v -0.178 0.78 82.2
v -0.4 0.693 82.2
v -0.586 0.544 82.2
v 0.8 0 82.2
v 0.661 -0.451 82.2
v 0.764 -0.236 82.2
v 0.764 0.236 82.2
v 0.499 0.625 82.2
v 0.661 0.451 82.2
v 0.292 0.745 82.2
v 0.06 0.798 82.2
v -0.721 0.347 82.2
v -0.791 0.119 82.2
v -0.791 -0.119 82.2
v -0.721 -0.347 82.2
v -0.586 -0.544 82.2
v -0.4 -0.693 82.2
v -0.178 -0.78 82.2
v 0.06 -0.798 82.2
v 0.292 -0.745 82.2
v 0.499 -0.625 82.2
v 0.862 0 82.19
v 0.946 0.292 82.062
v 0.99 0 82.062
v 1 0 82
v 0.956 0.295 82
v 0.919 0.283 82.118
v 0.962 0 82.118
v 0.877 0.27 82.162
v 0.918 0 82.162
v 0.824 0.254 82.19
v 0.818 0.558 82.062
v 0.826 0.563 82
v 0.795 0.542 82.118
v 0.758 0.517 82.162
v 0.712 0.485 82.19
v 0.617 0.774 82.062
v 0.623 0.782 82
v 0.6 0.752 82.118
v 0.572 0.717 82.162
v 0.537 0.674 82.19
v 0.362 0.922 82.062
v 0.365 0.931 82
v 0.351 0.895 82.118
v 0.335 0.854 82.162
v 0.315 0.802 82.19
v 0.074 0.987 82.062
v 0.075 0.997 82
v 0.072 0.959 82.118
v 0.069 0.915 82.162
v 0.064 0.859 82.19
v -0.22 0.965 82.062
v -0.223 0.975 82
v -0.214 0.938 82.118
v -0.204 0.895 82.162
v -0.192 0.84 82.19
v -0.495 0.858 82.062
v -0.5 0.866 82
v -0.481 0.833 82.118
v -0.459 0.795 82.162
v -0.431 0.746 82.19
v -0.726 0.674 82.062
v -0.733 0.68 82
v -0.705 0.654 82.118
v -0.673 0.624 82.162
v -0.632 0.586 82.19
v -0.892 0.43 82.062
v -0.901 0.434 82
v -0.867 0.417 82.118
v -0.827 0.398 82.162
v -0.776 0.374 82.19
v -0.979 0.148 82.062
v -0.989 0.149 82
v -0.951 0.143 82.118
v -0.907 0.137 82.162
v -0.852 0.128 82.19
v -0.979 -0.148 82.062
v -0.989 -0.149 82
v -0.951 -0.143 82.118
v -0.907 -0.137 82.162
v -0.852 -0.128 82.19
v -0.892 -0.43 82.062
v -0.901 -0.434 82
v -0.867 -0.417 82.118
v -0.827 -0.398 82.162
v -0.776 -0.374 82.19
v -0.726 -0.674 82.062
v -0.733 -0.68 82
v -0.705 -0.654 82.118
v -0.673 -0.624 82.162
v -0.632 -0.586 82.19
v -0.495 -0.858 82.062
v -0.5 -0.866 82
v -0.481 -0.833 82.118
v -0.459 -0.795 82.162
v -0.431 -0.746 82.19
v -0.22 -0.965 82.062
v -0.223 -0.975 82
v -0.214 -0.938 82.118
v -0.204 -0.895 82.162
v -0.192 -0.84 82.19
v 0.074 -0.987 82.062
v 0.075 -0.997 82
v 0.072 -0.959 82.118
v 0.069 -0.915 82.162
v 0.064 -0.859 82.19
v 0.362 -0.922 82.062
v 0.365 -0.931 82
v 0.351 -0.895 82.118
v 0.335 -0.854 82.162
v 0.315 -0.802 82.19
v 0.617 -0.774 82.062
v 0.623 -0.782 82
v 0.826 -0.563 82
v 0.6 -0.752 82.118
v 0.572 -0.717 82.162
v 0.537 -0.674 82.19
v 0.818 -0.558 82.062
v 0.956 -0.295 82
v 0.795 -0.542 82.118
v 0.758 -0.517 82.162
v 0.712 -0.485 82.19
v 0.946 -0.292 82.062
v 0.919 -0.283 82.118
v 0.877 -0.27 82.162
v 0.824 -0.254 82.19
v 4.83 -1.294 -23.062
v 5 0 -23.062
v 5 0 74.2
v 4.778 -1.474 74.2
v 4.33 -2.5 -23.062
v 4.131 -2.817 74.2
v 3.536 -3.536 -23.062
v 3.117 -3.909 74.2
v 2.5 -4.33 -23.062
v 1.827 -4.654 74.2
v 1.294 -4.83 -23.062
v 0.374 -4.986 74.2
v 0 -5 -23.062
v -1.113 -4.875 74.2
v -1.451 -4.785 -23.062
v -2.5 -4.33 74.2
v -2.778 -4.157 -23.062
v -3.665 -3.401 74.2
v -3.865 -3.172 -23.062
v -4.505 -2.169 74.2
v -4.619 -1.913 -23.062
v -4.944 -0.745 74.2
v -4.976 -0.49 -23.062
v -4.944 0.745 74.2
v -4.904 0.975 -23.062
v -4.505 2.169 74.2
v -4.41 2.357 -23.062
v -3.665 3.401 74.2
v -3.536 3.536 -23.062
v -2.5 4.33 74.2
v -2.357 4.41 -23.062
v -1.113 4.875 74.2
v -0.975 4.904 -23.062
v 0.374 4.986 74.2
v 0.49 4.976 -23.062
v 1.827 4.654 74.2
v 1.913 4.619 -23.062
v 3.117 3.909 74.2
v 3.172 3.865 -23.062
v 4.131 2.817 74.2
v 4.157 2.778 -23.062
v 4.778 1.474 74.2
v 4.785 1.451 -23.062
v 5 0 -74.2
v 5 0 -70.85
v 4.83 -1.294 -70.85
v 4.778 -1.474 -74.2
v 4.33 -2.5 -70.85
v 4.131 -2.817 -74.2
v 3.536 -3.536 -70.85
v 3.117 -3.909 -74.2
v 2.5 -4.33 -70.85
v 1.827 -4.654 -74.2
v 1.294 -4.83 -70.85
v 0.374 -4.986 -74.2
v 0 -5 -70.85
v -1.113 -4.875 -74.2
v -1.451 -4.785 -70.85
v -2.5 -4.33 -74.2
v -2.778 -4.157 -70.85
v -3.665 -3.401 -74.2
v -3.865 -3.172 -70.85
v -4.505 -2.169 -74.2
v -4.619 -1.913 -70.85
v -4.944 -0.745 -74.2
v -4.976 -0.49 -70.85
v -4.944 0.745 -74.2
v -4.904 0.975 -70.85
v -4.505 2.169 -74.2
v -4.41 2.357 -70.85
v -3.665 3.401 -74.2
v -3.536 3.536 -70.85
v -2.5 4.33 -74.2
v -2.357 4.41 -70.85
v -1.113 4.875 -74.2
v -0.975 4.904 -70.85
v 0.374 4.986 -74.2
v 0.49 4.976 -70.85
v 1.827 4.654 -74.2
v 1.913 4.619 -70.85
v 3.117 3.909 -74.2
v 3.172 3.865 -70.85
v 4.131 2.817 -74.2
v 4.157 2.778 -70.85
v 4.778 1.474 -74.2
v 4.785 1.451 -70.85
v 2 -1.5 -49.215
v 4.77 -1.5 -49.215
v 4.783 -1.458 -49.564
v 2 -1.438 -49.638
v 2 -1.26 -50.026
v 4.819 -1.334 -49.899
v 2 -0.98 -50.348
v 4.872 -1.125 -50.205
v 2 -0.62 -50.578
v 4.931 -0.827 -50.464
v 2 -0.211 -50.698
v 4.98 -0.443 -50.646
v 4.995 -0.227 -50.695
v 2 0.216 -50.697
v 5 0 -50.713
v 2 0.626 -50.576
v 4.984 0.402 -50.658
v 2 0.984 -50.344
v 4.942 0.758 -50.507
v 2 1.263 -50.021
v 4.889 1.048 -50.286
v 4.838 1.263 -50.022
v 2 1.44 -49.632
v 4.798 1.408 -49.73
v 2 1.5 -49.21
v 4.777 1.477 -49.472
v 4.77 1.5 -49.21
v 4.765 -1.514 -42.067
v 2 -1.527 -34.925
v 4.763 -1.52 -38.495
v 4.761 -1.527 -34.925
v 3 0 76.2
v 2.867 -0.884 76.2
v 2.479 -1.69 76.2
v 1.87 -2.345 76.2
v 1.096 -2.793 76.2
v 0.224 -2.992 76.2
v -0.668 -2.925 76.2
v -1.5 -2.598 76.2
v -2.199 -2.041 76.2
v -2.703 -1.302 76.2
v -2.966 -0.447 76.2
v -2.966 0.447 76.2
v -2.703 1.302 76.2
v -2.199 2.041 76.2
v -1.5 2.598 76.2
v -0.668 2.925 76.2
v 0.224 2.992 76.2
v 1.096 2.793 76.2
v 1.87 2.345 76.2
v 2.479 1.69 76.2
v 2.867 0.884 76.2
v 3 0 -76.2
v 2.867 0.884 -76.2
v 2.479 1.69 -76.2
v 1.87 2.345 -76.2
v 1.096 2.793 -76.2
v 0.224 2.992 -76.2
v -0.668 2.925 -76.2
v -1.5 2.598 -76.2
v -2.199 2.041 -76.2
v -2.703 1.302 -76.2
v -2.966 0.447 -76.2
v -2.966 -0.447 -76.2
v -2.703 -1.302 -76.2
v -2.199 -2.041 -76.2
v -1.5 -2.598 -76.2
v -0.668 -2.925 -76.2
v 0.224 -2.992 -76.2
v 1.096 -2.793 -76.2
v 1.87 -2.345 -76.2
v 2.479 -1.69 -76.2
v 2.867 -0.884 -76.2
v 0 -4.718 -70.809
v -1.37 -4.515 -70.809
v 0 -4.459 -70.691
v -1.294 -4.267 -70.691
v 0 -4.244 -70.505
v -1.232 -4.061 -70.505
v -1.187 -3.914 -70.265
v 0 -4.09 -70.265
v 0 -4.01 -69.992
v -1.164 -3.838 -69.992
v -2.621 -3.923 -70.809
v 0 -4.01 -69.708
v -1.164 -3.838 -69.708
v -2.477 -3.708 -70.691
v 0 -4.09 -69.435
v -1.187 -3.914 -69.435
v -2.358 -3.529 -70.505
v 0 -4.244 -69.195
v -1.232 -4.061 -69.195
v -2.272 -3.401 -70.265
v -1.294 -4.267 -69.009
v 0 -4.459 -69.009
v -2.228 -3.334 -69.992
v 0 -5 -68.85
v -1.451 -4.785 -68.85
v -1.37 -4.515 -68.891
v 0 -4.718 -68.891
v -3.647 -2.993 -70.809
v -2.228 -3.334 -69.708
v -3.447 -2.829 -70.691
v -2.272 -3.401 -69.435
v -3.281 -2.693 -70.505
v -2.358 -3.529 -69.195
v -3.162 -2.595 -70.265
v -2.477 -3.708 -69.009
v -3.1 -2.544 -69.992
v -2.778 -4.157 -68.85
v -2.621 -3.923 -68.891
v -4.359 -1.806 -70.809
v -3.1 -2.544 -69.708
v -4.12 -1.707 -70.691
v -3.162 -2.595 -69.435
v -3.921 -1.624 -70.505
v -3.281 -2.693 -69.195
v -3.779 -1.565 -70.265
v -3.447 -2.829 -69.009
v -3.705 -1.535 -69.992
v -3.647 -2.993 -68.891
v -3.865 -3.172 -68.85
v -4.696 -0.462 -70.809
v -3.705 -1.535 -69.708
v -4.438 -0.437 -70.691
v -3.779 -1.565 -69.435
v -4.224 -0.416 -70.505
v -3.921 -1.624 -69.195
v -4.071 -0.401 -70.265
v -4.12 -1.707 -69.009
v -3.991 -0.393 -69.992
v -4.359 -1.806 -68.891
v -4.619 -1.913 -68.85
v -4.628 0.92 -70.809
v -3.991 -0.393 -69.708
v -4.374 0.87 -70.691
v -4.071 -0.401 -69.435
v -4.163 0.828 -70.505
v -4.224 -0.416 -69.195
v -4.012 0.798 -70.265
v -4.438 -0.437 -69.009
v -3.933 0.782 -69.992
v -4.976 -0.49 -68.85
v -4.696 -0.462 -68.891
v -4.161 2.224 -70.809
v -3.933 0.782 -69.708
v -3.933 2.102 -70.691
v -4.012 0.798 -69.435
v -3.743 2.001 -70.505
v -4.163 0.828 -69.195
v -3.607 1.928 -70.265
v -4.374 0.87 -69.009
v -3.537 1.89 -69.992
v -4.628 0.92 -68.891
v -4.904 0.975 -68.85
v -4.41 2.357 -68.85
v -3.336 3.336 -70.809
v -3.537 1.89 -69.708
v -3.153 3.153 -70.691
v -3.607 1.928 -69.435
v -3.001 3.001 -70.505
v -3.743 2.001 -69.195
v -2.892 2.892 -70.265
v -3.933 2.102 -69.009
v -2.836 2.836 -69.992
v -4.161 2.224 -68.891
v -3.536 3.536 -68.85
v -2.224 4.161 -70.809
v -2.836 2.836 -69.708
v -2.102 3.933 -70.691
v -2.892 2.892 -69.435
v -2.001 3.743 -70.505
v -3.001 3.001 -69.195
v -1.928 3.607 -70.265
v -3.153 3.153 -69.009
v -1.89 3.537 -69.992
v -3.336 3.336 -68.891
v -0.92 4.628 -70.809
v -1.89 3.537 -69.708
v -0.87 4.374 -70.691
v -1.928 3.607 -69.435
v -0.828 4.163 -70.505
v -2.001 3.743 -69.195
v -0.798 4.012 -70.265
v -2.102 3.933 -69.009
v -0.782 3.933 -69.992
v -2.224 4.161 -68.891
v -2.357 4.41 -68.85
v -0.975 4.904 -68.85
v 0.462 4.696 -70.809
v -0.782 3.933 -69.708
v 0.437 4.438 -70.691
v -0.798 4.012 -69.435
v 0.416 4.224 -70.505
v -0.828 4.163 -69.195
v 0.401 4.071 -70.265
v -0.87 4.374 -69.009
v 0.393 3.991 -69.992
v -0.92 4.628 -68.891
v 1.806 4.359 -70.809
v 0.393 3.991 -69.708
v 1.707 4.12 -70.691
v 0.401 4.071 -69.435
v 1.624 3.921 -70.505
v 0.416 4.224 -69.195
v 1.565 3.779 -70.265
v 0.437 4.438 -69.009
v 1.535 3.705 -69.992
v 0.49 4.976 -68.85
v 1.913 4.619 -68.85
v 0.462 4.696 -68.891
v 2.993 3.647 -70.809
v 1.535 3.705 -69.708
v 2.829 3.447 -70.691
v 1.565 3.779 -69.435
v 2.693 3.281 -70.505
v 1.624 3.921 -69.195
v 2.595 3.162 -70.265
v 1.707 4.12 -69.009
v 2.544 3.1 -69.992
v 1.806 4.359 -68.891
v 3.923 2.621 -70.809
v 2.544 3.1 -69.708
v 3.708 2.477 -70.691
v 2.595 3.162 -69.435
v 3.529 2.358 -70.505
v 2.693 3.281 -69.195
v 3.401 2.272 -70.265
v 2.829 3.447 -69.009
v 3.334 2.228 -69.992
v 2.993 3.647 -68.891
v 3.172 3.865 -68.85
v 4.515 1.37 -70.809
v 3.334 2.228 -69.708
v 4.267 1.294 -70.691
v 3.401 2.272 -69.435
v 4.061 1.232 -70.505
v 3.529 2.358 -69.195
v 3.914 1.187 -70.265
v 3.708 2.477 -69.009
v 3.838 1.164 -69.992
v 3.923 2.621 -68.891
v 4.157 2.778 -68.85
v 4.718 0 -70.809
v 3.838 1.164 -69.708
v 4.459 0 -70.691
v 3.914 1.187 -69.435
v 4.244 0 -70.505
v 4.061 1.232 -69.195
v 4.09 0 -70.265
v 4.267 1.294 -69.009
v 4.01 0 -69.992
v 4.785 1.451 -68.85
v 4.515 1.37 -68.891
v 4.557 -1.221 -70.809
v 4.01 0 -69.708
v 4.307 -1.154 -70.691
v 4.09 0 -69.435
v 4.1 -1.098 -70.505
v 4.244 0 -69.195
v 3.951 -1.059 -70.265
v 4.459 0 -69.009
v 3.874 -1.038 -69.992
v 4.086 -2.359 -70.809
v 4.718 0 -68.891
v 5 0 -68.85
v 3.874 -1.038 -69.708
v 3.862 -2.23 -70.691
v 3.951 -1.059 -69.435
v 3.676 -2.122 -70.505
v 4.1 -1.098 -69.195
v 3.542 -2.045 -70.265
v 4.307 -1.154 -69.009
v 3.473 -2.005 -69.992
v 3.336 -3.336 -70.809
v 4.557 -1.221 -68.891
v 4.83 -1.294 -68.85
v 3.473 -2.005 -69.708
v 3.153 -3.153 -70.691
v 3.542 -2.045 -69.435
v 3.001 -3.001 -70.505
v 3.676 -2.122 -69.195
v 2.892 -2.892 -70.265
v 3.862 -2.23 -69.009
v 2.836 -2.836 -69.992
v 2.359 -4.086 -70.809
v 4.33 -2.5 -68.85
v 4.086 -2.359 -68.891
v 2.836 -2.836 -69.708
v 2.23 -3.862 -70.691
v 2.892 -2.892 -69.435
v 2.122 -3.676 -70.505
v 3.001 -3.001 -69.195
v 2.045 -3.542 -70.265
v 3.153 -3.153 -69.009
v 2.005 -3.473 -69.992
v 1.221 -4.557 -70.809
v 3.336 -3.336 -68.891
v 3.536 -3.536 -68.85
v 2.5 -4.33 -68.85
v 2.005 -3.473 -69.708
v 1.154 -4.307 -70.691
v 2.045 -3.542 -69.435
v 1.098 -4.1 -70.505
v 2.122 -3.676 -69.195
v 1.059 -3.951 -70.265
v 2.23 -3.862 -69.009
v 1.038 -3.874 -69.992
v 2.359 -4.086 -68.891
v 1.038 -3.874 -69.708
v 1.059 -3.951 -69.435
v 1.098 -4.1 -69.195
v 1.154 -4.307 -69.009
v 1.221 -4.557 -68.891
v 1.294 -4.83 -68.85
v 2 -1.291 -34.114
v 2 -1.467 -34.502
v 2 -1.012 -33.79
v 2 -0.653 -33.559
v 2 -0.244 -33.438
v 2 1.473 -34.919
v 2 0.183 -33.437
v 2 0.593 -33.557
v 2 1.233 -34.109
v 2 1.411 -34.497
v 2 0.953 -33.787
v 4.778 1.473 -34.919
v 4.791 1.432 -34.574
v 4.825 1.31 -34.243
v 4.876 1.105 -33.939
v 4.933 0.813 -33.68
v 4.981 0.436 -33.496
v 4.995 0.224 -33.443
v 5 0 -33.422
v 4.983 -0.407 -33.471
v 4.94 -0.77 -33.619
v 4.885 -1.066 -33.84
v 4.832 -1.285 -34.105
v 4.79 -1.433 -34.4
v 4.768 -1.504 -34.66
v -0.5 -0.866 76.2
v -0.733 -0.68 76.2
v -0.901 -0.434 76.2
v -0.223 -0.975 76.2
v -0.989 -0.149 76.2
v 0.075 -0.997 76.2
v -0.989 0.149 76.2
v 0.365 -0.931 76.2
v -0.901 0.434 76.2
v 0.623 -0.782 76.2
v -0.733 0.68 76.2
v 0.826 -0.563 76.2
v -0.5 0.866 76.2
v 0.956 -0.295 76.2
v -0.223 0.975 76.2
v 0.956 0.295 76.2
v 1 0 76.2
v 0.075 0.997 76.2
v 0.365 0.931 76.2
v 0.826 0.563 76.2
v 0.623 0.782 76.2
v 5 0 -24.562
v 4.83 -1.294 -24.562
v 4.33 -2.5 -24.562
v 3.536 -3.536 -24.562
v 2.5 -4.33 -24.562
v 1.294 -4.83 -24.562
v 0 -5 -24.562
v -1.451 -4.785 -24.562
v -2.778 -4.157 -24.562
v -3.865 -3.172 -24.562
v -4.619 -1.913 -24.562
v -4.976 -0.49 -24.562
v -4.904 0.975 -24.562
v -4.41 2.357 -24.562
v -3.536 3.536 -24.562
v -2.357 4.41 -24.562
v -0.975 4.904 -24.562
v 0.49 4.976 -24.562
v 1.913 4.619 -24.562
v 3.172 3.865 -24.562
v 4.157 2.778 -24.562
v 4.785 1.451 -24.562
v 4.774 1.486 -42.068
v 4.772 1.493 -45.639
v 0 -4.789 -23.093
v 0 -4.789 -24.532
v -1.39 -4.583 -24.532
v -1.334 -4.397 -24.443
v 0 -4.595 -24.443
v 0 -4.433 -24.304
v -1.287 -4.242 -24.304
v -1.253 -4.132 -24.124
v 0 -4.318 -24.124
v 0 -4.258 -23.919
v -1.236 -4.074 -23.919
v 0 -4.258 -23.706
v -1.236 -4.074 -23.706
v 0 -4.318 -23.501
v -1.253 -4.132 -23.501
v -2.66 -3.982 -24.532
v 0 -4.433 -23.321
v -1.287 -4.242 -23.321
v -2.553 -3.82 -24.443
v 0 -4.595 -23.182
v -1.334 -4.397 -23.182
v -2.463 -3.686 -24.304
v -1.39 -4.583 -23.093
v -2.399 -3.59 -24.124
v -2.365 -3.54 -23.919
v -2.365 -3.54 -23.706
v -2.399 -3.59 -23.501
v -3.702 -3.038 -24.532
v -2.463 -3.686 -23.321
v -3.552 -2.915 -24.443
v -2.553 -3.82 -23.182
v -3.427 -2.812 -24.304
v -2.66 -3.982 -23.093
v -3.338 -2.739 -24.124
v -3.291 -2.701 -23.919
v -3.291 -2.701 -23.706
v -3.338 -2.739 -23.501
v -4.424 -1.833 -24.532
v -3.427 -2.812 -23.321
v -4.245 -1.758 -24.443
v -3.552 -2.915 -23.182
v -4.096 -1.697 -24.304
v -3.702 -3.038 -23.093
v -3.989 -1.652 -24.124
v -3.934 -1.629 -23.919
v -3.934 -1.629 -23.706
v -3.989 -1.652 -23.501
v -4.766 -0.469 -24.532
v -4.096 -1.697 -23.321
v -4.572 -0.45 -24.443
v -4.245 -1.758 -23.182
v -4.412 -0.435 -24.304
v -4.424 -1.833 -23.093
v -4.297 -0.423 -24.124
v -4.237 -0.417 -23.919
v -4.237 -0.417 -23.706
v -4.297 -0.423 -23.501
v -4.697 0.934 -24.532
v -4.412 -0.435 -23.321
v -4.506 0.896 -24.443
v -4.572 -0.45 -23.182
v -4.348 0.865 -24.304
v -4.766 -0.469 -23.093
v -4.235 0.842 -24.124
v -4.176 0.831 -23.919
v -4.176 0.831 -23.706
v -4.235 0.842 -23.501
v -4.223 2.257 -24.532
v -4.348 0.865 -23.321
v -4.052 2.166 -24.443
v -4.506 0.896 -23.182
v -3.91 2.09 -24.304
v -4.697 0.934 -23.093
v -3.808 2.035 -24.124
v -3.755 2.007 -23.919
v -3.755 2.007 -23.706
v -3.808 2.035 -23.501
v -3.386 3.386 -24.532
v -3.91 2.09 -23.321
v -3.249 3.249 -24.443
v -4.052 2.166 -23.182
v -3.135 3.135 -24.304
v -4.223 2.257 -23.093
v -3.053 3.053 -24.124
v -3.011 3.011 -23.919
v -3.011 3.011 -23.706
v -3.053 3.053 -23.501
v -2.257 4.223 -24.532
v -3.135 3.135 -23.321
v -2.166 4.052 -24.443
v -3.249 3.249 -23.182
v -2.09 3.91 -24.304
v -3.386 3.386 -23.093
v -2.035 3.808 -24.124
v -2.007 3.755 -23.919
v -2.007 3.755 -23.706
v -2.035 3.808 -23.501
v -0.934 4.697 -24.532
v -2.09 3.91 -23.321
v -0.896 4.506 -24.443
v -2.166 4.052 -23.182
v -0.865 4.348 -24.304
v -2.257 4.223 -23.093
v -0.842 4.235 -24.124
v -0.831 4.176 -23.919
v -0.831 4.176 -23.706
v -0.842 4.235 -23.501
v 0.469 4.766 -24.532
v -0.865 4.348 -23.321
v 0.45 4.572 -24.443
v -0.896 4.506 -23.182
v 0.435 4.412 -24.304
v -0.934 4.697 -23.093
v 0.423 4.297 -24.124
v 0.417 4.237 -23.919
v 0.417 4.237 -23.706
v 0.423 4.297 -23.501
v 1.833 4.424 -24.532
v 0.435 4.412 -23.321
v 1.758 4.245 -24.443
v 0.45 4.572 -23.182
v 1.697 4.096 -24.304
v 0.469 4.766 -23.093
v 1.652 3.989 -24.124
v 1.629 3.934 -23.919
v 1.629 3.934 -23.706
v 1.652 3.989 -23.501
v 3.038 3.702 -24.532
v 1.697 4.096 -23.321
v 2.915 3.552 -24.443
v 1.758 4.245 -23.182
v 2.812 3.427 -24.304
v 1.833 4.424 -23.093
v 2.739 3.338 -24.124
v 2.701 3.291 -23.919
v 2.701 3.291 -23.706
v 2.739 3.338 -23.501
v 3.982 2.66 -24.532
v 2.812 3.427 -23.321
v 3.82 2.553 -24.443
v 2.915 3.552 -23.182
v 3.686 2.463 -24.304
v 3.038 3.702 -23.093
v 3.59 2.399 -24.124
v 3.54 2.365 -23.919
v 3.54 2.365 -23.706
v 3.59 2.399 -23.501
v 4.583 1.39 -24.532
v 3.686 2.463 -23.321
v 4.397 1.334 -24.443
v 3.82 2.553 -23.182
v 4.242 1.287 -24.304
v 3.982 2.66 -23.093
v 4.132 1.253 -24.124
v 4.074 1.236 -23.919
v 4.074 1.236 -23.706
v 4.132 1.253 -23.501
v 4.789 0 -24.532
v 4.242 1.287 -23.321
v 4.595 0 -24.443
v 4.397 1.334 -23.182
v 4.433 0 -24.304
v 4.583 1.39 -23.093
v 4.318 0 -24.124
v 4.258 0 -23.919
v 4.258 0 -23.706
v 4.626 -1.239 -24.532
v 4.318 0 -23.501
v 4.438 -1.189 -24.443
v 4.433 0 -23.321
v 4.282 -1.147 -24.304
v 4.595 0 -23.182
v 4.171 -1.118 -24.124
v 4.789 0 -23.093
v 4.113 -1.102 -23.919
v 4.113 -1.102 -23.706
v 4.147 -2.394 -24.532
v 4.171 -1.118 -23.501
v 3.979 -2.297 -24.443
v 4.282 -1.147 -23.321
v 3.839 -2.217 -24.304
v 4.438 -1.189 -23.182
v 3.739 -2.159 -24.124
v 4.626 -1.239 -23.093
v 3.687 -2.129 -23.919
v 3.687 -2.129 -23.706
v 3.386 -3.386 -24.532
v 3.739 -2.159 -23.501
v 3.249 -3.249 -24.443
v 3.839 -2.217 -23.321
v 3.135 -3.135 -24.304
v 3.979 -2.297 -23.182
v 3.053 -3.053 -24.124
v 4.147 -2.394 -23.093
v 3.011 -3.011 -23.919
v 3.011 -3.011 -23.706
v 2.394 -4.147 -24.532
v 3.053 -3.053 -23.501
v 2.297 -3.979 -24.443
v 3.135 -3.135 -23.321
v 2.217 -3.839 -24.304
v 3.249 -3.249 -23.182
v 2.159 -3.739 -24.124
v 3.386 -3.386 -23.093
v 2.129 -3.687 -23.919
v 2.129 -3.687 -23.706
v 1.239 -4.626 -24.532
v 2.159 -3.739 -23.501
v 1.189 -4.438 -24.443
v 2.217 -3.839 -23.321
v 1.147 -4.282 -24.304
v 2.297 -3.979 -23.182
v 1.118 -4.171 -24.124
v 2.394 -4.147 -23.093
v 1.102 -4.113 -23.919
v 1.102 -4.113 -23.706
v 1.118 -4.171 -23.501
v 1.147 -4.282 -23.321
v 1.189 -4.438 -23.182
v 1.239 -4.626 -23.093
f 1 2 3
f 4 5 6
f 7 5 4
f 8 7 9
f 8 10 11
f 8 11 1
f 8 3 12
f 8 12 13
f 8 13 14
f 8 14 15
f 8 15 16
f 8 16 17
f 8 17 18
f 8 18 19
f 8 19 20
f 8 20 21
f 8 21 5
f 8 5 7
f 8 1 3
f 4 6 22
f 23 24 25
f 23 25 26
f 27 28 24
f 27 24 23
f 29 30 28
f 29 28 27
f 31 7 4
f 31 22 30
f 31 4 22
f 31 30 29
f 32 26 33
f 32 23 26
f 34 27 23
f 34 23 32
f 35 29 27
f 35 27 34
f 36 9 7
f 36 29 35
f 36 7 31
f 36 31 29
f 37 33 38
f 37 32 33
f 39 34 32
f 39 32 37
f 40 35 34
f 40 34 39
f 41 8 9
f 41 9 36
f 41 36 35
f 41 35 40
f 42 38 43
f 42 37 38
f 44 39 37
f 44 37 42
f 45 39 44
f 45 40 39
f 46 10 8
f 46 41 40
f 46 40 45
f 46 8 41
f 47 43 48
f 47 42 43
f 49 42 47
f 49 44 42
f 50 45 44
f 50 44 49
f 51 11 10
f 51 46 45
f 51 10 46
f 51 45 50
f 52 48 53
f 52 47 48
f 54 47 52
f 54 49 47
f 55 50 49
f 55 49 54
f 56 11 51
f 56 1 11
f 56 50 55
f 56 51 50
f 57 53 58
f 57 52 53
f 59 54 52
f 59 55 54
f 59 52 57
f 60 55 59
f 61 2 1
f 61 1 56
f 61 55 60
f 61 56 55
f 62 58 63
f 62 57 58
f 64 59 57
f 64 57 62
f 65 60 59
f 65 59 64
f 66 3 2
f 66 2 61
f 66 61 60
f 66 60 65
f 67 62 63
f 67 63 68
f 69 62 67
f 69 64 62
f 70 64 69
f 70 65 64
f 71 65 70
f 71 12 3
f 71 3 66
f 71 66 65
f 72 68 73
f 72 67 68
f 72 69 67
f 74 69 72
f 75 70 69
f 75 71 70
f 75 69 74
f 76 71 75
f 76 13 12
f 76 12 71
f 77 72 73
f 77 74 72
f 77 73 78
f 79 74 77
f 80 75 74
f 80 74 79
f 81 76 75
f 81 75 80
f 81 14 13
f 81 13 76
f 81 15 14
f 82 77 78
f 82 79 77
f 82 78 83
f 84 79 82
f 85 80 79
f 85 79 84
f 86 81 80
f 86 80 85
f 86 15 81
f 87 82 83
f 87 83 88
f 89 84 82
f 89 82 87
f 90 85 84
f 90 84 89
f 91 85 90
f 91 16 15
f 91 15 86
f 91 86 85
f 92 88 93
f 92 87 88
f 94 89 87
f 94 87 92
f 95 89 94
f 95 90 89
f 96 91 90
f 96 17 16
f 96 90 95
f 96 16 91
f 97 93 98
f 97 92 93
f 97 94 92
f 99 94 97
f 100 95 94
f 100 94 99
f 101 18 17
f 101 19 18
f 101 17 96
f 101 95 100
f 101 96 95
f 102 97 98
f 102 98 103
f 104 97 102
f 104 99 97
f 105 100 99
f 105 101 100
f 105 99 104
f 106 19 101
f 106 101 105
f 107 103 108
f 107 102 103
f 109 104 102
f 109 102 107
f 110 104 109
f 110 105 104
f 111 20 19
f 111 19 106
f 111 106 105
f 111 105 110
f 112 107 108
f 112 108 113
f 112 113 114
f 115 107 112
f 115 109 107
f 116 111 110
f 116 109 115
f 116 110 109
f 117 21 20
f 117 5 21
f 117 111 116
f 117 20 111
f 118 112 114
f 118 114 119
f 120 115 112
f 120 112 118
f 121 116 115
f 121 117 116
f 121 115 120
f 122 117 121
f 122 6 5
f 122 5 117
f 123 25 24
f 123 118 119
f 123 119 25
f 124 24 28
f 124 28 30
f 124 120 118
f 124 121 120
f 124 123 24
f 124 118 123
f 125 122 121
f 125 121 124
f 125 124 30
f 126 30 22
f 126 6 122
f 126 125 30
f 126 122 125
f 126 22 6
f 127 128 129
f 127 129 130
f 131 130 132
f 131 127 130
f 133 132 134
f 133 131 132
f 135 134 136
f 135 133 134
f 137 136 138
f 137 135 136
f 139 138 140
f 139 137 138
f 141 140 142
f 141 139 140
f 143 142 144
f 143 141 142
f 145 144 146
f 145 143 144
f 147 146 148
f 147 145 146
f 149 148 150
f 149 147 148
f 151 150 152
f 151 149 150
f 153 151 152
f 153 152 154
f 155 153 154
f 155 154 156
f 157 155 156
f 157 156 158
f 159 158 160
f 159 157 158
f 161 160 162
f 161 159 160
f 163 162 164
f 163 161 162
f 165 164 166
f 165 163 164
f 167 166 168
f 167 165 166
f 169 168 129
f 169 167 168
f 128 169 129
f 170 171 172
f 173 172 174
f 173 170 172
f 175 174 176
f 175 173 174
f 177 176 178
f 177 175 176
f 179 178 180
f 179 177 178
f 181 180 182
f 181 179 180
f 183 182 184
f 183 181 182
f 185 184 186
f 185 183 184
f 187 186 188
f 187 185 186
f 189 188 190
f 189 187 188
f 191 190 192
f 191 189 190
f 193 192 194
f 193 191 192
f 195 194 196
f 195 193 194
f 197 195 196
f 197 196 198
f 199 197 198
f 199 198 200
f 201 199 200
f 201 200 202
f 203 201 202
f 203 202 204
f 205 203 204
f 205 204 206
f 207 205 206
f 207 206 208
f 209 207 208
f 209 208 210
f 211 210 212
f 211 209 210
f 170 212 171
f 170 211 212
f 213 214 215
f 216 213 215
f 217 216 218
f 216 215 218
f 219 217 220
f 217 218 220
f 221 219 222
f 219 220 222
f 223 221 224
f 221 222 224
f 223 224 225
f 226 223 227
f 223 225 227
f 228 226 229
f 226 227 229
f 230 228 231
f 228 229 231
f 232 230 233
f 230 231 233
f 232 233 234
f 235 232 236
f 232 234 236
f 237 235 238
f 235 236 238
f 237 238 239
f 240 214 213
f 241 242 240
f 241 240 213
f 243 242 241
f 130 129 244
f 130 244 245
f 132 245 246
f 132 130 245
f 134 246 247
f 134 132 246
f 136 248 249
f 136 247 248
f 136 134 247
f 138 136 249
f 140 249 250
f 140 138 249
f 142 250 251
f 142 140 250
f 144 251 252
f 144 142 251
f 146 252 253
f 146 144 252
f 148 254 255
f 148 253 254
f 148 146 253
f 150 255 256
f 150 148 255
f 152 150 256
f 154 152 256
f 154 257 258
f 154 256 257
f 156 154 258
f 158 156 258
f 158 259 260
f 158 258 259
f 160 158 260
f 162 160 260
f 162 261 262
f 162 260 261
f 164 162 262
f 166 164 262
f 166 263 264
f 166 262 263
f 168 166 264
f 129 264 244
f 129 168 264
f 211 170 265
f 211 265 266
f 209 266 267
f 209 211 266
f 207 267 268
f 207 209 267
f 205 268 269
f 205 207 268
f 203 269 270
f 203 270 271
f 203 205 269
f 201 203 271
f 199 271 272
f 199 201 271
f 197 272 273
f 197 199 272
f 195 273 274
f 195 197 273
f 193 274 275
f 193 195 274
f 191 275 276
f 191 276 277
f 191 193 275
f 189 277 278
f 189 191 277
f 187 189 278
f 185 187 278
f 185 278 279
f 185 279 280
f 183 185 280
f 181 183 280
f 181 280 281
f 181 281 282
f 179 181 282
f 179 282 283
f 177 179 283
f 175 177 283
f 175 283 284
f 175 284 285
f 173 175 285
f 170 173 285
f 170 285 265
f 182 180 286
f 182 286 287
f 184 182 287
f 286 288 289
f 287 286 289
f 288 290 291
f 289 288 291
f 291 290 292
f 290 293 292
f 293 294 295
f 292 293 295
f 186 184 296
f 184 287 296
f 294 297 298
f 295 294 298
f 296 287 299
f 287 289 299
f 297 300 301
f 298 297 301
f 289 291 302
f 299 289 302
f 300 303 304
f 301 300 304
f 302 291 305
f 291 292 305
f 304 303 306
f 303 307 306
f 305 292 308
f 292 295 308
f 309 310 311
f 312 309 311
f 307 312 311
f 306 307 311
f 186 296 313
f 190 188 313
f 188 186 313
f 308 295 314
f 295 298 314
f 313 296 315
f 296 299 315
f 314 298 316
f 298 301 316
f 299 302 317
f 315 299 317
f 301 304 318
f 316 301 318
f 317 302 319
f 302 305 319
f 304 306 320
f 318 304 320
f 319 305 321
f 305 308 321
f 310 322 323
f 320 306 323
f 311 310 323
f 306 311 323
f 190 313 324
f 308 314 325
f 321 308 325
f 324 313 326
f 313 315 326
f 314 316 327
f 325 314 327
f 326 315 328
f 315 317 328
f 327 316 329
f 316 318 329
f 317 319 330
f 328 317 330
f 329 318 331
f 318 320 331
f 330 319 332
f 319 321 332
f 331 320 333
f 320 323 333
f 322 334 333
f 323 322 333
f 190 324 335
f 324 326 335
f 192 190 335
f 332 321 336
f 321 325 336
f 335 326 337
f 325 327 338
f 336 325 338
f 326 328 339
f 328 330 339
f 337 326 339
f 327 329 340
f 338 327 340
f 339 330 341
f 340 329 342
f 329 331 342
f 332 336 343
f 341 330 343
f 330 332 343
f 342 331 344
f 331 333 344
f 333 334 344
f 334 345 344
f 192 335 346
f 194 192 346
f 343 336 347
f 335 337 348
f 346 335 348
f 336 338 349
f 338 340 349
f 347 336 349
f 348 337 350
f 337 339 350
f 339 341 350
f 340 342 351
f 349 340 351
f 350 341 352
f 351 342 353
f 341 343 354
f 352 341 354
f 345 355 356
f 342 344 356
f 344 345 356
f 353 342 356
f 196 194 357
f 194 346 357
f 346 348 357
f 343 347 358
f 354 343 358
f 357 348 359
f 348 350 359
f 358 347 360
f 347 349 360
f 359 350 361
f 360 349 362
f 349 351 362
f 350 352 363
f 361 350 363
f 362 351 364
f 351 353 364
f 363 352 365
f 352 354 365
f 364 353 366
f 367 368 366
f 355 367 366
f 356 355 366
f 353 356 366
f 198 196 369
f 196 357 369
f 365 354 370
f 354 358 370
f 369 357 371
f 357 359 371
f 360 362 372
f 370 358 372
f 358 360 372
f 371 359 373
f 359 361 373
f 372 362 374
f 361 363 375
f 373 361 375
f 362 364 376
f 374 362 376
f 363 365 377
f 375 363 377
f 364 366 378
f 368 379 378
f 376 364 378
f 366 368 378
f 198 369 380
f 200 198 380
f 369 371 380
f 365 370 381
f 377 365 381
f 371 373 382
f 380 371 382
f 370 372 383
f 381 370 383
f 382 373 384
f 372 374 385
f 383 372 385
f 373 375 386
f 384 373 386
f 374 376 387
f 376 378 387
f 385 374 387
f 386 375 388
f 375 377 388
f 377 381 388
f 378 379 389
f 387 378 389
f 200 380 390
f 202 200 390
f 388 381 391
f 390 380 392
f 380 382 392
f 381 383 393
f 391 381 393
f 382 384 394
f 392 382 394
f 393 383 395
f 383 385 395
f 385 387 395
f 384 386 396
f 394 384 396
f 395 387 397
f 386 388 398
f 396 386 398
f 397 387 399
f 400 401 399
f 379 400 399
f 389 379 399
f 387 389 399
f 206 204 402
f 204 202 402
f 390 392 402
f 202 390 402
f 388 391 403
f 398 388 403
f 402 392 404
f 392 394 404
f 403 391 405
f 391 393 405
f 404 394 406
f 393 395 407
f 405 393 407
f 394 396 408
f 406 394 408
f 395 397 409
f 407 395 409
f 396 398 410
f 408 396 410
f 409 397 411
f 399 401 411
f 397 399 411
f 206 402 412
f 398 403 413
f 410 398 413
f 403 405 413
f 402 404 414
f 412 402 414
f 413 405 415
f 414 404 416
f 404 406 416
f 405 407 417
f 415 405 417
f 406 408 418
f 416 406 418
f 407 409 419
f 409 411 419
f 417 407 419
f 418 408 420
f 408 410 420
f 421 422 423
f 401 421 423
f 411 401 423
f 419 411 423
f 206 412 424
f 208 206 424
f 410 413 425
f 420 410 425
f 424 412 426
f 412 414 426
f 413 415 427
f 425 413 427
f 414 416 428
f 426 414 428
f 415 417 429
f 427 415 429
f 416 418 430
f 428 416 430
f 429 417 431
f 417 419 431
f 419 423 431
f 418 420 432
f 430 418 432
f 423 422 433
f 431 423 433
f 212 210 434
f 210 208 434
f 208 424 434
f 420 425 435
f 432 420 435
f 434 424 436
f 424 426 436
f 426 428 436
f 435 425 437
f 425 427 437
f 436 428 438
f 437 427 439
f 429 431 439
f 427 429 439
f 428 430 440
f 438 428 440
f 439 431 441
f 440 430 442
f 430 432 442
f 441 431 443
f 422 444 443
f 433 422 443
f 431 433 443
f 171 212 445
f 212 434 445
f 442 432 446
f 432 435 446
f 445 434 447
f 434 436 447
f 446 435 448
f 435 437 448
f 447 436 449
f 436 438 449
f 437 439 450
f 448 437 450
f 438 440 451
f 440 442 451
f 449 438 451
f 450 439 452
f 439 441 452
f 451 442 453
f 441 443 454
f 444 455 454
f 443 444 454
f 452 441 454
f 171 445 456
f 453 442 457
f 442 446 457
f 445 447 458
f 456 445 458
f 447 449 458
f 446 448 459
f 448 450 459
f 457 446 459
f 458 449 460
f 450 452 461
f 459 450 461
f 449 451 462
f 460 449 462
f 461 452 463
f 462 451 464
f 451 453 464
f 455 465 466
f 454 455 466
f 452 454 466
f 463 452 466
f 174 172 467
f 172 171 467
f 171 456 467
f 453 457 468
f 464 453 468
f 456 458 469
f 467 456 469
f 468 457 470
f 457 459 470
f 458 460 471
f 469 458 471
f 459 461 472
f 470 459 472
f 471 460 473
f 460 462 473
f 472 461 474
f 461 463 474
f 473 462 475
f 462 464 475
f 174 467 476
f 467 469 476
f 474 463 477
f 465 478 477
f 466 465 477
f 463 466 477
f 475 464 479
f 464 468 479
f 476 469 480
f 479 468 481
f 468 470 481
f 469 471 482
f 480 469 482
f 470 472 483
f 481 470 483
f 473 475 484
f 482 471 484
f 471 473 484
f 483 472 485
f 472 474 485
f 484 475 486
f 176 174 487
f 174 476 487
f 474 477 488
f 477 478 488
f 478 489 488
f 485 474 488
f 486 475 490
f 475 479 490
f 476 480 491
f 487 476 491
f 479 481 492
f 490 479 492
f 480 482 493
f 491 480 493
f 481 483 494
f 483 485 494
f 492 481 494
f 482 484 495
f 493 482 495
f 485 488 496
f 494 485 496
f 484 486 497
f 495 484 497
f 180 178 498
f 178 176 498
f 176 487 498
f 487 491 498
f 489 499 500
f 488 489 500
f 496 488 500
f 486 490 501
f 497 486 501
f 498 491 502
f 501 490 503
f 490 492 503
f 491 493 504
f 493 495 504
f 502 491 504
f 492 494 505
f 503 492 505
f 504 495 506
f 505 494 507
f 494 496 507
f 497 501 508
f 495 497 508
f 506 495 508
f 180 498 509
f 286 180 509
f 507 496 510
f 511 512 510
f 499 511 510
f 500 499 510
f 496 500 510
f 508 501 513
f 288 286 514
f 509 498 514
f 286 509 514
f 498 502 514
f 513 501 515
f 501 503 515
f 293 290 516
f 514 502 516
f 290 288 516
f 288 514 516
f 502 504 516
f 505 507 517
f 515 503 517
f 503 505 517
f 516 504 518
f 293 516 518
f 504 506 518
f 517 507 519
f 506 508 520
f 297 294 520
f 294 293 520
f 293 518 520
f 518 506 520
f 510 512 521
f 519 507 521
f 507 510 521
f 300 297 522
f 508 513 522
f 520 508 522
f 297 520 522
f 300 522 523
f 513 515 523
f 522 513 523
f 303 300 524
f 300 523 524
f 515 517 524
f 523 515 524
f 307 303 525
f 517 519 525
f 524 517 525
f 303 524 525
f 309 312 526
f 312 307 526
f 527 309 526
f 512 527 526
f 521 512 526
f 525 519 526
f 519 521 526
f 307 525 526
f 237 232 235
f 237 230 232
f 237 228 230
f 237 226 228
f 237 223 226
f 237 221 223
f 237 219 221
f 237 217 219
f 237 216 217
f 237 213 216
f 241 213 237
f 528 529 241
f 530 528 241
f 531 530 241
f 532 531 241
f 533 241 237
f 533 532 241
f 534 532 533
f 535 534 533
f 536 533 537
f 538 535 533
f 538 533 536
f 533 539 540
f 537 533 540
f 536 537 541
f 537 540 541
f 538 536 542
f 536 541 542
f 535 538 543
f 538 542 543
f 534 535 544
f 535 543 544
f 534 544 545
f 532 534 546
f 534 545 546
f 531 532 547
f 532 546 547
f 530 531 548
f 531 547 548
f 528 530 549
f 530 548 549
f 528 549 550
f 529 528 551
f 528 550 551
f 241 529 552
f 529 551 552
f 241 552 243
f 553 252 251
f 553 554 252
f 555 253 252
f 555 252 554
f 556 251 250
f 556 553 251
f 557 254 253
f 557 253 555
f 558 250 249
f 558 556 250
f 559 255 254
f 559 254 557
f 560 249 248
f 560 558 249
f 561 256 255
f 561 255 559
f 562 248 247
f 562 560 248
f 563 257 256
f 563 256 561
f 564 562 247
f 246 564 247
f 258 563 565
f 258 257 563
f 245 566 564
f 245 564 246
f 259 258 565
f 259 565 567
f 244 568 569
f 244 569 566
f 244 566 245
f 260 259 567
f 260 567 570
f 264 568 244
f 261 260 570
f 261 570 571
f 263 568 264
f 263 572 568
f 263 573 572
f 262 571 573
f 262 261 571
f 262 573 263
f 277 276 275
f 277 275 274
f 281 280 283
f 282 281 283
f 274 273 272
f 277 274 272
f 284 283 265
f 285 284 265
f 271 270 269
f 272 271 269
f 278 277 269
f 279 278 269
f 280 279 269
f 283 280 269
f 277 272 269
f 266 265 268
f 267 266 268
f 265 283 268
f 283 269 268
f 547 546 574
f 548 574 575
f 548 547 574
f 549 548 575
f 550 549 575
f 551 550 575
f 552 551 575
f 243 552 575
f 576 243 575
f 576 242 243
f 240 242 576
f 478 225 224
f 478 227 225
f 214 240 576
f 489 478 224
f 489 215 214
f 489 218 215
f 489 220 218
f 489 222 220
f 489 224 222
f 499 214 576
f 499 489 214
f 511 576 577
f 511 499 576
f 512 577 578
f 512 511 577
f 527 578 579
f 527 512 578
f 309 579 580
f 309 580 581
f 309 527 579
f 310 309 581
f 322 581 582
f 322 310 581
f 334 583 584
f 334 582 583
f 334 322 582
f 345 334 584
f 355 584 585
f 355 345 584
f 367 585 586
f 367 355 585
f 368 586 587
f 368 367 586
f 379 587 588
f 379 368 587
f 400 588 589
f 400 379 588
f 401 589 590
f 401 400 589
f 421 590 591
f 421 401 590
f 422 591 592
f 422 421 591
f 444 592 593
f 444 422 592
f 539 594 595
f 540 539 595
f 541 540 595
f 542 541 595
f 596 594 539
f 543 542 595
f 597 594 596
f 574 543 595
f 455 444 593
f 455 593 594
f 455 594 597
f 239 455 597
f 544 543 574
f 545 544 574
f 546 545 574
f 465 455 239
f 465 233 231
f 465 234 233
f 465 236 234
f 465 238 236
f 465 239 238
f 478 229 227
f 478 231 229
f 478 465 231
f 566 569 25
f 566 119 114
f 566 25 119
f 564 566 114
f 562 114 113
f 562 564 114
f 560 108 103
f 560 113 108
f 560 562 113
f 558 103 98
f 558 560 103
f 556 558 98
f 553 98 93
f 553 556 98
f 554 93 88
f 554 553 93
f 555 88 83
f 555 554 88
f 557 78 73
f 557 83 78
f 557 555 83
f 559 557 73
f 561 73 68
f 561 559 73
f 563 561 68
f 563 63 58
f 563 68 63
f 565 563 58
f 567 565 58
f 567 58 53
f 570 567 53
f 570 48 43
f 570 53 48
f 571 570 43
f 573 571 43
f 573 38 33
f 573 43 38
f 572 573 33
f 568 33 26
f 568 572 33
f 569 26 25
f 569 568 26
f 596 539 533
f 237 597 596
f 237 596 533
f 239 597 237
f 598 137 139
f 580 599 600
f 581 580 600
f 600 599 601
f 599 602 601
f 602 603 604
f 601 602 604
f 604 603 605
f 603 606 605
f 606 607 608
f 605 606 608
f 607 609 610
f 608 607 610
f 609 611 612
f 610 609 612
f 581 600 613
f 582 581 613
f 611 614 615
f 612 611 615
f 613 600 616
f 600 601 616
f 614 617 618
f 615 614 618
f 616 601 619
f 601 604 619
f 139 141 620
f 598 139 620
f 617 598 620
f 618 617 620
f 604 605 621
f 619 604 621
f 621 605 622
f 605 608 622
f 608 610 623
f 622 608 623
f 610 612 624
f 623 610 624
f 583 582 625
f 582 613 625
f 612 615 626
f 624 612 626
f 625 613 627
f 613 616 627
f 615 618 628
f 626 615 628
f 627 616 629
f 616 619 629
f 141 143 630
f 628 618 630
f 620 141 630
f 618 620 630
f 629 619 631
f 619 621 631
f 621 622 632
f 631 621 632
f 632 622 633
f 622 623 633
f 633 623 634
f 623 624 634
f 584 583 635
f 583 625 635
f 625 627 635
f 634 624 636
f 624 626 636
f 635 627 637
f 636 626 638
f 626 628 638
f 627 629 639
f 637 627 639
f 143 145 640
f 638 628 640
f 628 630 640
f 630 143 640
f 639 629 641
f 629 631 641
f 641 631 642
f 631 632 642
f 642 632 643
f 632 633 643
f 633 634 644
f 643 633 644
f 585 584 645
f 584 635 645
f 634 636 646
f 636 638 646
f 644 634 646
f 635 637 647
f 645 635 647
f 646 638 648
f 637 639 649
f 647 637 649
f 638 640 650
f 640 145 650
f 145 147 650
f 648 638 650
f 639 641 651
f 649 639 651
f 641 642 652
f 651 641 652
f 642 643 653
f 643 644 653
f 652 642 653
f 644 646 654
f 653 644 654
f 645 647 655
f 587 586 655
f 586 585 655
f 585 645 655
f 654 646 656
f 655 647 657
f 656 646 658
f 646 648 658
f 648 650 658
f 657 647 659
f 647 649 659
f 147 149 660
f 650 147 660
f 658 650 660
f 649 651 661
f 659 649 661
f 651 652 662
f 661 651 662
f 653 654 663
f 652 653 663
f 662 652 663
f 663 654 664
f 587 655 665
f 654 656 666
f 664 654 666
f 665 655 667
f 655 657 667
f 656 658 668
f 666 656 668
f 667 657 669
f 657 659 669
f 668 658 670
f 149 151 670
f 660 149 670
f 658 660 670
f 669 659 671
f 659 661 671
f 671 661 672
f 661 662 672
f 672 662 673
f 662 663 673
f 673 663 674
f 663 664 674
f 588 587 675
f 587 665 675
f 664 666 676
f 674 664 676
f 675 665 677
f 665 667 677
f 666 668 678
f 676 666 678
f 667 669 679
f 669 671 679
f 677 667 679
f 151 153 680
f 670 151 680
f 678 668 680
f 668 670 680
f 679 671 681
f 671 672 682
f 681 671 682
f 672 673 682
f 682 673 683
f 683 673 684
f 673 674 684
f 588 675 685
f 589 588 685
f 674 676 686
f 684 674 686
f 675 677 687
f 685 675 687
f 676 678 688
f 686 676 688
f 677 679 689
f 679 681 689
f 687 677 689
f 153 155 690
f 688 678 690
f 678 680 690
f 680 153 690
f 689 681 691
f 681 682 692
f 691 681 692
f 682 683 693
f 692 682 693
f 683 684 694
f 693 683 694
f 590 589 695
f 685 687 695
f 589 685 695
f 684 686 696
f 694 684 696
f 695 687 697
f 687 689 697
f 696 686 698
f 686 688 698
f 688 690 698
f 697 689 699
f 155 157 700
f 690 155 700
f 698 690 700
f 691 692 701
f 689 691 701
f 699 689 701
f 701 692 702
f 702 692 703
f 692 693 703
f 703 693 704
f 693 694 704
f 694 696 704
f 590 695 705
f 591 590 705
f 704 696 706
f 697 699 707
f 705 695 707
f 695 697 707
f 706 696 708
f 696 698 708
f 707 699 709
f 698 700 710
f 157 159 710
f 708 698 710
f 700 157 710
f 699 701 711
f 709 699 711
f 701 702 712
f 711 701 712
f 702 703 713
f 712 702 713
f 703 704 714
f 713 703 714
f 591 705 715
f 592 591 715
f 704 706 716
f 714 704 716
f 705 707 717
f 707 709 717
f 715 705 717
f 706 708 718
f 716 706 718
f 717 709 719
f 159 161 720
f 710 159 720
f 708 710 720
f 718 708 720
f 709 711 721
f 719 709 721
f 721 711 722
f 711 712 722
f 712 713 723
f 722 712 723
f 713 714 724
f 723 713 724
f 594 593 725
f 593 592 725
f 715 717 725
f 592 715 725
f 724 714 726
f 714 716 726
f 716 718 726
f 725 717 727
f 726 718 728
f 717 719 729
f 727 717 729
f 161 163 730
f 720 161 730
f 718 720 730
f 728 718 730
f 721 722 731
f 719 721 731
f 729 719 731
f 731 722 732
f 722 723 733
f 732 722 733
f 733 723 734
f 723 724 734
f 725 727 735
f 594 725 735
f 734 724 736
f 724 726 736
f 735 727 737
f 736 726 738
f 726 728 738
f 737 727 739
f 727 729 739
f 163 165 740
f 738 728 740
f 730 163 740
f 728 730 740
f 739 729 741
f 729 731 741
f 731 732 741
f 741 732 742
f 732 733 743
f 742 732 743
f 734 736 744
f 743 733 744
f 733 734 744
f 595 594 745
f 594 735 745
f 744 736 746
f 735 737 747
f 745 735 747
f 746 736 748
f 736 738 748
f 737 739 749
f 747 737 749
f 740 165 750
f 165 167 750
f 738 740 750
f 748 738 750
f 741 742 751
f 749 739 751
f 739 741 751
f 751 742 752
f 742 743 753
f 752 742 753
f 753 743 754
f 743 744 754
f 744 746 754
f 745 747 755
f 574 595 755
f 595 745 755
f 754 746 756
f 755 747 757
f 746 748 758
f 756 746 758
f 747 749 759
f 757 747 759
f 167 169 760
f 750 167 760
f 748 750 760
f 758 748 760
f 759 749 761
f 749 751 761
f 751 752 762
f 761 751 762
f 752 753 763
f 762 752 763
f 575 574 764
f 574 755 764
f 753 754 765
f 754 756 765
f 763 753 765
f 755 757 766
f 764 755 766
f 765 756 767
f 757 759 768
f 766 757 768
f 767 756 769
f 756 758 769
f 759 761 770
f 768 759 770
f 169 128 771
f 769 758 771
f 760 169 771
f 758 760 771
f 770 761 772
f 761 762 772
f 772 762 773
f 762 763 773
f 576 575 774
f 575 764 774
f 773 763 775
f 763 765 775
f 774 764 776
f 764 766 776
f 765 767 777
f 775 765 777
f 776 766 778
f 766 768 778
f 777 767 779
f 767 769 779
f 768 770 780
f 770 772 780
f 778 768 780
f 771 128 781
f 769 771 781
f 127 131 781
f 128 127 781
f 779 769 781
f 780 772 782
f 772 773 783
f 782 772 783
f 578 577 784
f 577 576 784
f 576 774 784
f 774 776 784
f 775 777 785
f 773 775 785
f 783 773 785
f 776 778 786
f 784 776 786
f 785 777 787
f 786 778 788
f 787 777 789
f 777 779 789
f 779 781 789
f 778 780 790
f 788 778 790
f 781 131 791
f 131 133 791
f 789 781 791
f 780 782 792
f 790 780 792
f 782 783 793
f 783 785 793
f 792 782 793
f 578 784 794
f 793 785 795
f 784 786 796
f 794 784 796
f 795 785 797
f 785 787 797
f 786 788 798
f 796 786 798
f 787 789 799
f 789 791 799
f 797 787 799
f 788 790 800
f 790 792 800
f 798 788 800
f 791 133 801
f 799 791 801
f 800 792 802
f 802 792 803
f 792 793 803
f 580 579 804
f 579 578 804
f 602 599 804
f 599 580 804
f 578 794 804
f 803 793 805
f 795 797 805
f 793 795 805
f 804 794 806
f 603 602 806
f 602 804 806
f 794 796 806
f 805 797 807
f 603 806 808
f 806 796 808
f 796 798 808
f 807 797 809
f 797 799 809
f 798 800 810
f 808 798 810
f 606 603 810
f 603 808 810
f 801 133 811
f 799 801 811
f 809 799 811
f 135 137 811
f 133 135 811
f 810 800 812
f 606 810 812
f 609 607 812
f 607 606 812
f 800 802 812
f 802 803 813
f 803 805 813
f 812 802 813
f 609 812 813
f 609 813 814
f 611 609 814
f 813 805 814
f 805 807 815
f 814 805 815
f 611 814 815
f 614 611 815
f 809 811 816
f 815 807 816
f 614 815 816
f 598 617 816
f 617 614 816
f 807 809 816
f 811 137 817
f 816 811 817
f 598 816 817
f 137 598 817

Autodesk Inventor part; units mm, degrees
ref_plane "XZ Plane" through (0, 0, 0) normal (0, 1, 0) x (-1, 0, 0)
sketch "Sketch1" plane through (0, 0, 0) normal (0, 0, 1) x (1, 0, 0)
  circle A0 centre (0, 0) radius 5
  dimension "d0" = 10
extrude "Extrusion1" add sketch "Sketch1" along normal mid plane 152.4
ref_plane "Work Plane4" through (0, 0, 0) normal (0, 0, 1) x (1, 0, 0)
ref_plane "Work Plane5" through (0, 0, -2) normal (0, 0, 1) x (1, 0, 0)
ref_plane "Work Plane6" through (5, 0, 0) normal (1, 0, 0) x (0, 1, 0)
sketch "Sketch6" plane through (5, 0, 0) normal (1, 0, 0) x (0, 1, 0)
  point P0 (0, 0)
sketch "Sketch7" plane through (5, 0, 0) normal (1, 0, 0) x (0, 1, 0)
  line L0 (0, 106.68) -> (0, -106.68) projected
  line L1 (-1.5, -49.2154) -> (-1.5272, -34.9251)
  line L2 (1.4728, -34.9193) -> (1.5, -49.2096)
  arc A0 (-1.5, -49.2154) -> (1.5, -49.2096) centre (0, -49.2125) ccw
  arc A1 (1.4728, -34.9193) -> (-1.5272, -34.9251) centre (-0.0272, -34.9222) ccw
  line L3 (-1.5, -49.2154) -> (1.5, -49.2096) construction
  line L4 (-1.5272, -34.9251) -> (1.4728, -34.9193) construction
  point P0 (0, 0)
  dimension "d28" = 3
extrude "Extrusion2" cut sketch "Sketch7" against normal blind 3
chamfer "Chamfer2" distance 2 angle 45 1 edges at (-5, 0, -76.2)
chamfer "Chamfer3" distance 2 angle 45 1 edges at (-5, 0, 76.2)
sketch "Sketch8" plane through (0, 0, 76.2) normal (0, 0, 1) x (1, 0, 0)
  circle A0 centre (0, 0) radius 1
  dimension "d48" = 2
extrude "Extrusion3" add sketch "Sketch8" along normal blind 6
fillet "Fillet1" radius 0.2 1 edges at (-1, 0, 82.2)
sketch "Sketch9" plane through (0, 0, 0) normal (1, 0, 0) x (0, 1, 0)
  line L0 (-5, -74.2) -> (5, -74.2) projected
  line L1 (-1.5, -49.2154) -> (-1.5272, -34.9251) projected
  line L2 (1.4728, -34.9193) -> (1.5, -49.2096) projected
  line L3 (5, 74.2) -> (-5, 74.2) projected
  line L4 (-5, -74.2) -> (-5, 74.2) projected
  circle A0 centre (-5, -69.85) radius 1
  circle A1 centre (-5, -23.8125) radius 0.75
  line L5 (0, -103.88) -> (0, 103.88) projected
  point P0 (0, 0)
  point P1 (0, -50.7125)
  point P2 (0, -33.4224)
  dimension "d53" = 2
  dimension "d54" = 1.5
revolve "Revolution4" cut sketch "Sketch9" angle 360 about axis through (0, 0, -10) along (0, 0, 1) contours A0 L4 | L4 A0 | A1 L4 | L4 A1
properties part number "Motor shaft" material "Steel, High Strength Low Alloy"
